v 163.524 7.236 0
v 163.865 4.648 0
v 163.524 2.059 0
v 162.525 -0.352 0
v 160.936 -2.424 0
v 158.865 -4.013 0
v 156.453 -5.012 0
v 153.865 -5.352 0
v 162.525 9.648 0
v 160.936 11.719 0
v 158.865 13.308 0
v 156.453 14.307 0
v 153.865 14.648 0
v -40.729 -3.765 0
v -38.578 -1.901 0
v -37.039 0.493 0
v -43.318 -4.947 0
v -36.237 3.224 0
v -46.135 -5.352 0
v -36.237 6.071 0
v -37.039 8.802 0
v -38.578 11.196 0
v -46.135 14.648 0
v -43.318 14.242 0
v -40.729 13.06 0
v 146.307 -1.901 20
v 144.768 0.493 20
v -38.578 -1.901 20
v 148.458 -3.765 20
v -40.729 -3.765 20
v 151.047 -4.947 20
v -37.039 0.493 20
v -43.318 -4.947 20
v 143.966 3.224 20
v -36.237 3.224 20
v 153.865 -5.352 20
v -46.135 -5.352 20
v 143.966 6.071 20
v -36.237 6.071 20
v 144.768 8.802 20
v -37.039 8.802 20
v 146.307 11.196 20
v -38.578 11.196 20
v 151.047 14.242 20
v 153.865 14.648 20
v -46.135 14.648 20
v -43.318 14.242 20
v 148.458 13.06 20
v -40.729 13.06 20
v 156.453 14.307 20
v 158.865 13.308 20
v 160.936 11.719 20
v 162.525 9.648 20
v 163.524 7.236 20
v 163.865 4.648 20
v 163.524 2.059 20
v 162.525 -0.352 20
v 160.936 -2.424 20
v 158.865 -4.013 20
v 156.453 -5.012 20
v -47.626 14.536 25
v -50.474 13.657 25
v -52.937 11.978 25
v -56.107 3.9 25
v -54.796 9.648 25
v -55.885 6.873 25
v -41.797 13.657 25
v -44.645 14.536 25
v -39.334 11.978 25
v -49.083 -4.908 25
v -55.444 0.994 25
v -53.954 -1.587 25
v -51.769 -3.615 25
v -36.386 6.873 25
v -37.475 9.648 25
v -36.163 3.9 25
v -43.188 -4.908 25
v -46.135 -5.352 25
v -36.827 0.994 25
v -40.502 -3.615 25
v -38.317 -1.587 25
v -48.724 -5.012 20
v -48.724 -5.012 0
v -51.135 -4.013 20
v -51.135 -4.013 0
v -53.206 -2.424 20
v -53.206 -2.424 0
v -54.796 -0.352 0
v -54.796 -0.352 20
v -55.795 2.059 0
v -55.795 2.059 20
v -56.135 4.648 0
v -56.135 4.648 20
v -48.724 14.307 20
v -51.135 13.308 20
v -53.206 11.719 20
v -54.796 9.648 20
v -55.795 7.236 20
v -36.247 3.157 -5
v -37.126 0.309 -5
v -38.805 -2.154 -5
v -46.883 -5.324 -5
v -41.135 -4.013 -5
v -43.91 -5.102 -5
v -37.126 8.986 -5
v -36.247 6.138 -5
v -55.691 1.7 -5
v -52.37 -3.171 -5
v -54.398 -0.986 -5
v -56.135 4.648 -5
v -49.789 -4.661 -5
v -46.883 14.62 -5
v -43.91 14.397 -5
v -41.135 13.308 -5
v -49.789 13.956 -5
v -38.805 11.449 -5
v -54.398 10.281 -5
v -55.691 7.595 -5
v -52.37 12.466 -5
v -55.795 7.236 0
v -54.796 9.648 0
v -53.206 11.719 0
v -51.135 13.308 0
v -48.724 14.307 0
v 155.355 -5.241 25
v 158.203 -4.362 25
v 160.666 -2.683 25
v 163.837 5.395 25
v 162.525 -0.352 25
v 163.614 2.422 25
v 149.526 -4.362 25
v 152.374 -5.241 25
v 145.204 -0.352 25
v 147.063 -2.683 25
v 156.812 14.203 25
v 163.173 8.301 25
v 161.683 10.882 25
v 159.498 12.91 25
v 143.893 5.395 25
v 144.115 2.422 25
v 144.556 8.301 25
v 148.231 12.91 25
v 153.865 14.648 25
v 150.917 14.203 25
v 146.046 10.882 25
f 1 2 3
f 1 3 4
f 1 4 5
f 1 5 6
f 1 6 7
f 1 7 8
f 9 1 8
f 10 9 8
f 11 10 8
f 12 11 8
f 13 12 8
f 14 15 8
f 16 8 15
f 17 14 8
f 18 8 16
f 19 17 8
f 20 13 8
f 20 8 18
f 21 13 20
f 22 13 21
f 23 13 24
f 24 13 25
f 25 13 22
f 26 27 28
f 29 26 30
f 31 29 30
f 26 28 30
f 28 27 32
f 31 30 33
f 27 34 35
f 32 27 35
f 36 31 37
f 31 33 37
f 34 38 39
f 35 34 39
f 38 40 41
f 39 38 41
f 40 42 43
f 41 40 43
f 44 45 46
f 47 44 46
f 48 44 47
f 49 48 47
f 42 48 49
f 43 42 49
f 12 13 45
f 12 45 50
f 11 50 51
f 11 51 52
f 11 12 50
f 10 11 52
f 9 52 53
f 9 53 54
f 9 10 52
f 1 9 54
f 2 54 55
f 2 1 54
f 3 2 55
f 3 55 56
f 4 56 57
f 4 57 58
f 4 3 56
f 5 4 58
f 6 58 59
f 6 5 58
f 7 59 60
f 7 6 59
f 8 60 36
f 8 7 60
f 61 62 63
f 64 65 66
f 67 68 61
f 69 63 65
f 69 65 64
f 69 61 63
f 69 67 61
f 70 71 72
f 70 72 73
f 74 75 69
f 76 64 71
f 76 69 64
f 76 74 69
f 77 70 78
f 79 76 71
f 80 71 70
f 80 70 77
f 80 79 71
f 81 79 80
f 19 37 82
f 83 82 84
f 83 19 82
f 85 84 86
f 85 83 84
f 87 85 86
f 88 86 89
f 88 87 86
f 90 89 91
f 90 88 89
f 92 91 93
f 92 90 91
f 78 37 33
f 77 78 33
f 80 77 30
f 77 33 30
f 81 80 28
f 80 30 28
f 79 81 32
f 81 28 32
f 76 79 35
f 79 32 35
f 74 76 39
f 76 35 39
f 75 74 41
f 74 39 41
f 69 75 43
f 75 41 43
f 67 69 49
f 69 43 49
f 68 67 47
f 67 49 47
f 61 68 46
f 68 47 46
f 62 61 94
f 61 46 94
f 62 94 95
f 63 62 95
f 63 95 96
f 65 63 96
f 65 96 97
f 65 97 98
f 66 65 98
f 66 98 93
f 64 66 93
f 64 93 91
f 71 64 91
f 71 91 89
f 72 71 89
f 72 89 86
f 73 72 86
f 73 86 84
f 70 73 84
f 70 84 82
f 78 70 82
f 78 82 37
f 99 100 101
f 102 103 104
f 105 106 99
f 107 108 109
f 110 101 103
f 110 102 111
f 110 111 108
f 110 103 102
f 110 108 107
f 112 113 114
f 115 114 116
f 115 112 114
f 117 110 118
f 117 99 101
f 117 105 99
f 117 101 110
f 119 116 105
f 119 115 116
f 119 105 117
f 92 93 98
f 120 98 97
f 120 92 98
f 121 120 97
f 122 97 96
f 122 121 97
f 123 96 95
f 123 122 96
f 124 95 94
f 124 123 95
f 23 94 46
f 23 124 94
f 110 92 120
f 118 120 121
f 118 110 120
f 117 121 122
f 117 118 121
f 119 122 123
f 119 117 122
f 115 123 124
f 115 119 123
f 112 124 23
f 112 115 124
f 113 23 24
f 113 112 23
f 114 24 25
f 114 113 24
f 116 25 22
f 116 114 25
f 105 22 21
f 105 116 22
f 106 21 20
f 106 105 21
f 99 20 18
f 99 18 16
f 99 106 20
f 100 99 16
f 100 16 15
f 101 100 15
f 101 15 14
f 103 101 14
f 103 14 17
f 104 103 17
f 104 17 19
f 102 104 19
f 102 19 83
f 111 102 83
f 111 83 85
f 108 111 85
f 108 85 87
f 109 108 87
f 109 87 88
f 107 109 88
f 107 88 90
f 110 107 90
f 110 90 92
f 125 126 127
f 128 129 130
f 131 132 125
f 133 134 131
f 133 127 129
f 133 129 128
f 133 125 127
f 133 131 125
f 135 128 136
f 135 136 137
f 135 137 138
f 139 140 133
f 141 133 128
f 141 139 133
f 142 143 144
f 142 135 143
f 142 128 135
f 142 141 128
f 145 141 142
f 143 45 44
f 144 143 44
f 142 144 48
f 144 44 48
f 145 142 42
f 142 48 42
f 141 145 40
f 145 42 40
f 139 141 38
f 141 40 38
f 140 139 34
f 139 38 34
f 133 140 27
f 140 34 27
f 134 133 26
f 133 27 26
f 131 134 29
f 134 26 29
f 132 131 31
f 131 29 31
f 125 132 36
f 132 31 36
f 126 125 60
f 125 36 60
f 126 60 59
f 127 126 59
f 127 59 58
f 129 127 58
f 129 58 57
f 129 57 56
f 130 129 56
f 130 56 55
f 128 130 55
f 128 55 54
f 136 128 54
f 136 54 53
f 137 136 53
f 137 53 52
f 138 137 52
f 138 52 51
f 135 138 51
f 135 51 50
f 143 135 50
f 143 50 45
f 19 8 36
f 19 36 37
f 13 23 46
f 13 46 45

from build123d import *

# Parameters (mm, degrees)
BOSS_EXTRUDE1_DEPTH = 20
SKETCH2_R           = 10
BOSS_EXTRUDE2_DEPTH = 5
BOSS_EXTRUDE3_START = 5
SKETCH3_R           = 10
BOSS_EXTRUDE3_DEPTH = 5
SKETCH4_R           = 10
BOSS_EXTRUDE4_DEPTH = 5


with BuildPart() as part:
    # Sketch1 → Boss-Extrude1 (new body)
    with BuildSketch(Plane.XY):
        with BuildLine():
            Line((-46.135379716, 14.647544511), (153.864620284, 14.647544511))
            ThreePointArc((153.864620284, 14.647544511), (160.935688096, 11.718612322), (163.864620284, 4.647544511))
            ThreePointArc((163.864620284, 4.647544511), (160.935688096, -2.423523301), (153.864620284, -5.352455489))
            Line((153.864620284, -5.352455489), (-46.135379716, -5.352455489))
            ThreePointArc((-46.135379716, -5.352455489), (-53.206447528, -2.423523301), (-56.135379716, 4.647544511))
            ThreePointArc((-56.135379716, 4.647544511), (-53.206447528, 11.718612322), (-46.135379716, 14.647544511))
        make_face()
    extrude(amount=BOSS_EXTRUDE1_DEPTH)

    # Sketch2 → Boss-Extrude2 (add)
    with BuildSketch(Plane.XY.offset(20)):
        with Locations(Location((-46.135379716, 4.647544511, 0), (0, 0, 270))):
            Circle(SKETCH2_R)
    extrude(amount=BOSS_EXTRUDE2_DEPTH)

    # Sketch3 → Boss-Extrude3 (add)
    with BuildSketch(Plane(origin=(0, 0, 0), x_dir=(-1, 0, 0), z_dir=(0, 0, -1)).offset(BOSS_EXTRUDE3_START)):
        with Locations((46.135379716, 4.647544511)):
            Circle(SKETCH3_R)
    extrude(amount=-BOSS_EXTRUDE3_DEPTH)

    # Sketch4 → Boss-Extrude4 (add)
    with BuildSketch(Plane.XY.offset(20)):
        with Locations(Location((153.864620284, 4.647544511, 0), (0, 0, 90))):
            Circle(SKETCH4_R)
    extrude(amount=BOSS_EXTRUDE4_DEPTH)


solid = part.part
